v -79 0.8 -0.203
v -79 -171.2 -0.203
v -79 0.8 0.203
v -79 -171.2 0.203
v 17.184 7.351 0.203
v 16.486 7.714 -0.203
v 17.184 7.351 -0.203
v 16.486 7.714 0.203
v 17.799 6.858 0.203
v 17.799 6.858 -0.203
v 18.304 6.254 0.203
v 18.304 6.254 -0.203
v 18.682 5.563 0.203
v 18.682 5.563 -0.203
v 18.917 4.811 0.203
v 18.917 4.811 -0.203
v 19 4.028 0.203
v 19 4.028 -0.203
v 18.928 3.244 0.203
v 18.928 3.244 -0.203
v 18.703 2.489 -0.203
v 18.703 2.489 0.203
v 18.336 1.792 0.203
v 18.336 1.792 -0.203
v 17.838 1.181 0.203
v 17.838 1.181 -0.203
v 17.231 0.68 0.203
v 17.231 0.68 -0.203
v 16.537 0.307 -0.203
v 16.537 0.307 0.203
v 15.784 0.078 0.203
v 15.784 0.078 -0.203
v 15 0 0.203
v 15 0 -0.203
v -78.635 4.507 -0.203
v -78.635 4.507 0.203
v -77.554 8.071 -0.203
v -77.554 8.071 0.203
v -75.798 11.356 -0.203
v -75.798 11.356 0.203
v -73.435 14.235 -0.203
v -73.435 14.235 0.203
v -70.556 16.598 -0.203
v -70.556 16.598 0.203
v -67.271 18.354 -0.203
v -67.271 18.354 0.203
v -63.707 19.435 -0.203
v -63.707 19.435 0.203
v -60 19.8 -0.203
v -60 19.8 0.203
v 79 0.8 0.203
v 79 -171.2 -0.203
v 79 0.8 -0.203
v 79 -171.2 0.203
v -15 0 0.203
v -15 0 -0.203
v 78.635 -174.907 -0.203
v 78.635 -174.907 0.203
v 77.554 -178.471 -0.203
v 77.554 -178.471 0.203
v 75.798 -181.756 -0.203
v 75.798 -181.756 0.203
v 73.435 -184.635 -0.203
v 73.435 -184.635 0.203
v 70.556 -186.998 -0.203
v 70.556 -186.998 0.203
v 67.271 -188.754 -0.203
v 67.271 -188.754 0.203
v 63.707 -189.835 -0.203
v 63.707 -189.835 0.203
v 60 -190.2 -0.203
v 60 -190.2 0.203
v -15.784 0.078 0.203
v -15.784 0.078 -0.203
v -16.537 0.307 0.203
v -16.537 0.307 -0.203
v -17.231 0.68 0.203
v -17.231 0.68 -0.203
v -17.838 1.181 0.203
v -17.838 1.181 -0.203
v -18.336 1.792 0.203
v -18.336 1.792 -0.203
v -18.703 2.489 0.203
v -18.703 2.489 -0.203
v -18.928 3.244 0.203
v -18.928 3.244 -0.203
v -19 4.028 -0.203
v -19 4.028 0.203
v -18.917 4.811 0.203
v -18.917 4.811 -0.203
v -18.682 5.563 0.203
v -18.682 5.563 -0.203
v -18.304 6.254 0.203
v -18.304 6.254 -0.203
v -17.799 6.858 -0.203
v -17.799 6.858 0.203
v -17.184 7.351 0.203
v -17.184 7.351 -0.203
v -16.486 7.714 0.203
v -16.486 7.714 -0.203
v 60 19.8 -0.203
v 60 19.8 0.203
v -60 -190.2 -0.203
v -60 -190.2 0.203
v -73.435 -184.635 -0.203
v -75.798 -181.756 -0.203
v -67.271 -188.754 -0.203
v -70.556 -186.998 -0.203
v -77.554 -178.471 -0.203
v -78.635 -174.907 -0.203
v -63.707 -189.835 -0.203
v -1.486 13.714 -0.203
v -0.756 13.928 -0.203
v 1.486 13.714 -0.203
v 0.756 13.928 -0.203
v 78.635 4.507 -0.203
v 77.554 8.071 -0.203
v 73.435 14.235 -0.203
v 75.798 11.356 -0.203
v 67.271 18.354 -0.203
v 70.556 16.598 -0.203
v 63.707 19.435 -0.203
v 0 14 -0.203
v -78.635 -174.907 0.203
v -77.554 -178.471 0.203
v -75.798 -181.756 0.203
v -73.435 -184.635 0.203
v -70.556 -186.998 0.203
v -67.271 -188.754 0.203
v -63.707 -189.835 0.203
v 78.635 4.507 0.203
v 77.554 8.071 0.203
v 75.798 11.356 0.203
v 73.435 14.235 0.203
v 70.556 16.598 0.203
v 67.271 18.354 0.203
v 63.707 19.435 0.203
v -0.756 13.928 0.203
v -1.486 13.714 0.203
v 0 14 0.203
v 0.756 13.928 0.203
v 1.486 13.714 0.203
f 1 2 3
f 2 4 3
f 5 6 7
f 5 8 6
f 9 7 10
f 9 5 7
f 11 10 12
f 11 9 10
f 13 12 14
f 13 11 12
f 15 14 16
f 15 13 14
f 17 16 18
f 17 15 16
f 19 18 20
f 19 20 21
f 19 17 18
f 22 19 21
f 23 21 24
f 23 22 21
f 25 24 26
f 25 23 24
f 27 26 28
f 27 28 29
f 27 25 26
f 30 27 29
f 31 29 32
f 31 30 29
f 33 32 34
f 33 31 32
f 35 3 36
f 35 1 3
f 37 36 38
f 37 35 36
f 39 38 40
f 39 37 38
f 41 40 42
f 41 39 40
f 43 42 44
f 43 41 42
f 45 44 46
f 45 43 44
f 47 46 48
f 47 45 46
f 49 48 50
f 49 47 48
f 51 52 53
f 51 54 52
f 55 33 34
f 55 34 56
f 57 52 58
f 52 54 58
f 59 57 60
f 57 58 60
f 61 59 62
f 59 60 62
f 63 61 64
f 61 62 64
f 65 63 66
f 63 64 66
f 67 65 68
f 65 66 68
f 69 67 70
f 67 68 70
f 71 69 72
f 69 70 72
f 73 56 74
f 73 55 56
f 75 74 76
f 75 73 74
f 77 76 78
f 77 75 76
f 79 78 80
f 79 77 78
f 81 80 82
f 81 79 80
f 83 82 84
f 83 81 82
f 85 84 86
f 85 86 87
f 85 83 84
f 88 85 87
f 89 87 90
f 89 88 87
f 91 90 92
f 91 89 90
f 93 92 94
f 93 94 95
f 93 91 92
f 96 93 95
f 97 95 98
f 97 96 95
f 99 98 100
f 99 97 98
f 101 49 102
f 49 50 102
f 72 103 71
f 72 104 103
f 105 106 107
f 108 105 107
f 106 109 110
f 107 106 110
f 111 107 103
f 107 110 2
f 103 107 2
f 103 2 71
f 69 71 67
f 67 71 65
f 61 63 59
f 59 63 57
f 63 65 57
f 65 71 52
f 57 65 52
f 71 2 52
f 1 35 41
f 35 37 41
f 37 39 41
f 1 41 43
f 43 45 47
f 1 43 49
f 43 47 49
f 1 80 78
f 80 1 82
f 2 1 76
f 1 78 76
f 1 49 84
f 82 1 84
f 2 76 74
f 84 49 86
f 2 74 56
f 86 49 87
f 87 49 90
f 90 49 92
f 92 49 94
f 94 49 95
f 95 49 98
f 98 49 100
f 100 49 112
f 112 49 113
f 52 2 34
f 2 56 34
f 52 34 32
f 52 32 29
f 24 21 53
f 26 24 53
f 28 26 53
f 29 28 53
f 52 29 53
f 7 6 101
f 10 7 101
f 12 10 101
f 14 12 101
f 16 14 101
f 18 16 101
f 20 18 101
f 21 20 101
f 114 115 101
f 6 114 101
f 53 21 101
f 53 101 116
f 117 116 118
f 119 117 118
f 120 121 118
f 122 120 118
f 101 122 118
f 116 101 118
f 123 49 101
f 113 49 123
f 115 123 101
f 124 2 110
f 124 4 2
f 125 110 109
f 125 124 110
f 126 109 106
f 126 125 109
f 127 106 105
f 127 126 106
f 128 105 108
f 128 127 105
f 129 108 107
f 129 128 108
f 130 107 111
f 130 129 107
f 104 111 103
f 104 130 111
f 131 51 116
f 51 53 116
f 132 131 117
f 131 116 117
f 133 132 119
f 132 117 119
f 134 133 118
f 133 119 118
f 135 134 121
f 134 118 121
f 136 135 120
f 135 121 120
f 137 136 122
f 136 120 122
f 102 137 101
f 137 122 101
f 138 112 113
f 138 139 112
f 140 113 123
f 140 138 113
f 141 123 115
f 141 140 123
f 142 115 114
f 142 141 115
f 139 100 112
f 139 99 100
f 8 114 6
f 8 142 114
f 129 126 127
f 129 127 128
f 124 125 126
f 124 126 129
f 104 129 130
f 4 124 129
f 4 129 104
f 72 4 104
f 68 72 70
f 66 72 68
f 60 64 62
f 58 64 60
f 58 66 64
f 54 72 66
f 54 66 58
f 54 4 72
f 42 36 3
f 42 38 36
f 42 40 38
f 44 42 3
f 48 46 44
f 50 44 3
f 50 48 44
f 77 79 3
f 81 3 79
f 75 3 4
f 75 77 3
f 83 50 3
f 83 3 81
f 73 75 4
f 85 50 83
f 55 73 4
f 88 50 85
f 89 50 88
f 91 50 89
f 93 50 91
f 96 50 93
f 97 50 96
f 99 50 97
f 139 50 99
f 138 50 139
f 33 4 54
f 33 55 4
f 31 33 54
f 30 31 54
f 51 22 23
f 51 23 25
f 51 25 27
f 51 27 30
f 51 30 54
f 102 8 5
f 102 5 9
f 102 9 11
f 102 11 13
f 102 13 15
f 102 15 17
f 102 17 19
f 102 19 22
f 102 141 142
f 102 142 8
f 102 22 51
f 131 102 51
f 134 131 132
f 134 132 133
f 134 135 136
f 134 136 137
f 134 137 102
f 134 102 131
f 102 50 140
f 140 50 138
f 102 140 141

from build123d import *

# Parameters (mm, degrees)
F0_W     = 158
F0_H     = 210
F1_DEPTH = 0.2032
F2_R     = 19


with BuildPart() as f1:
    # F0 (on Top) → F1 (new body, symmetric)
    with BuildSketch(Plane.XY):
        with Locations((0, -85.2)):
            Rectangle(F0_W, F0_H)
        with BuildLine():
            Line((15, 0), (-15, 0))
            ThreePointArc((-15, 0), (-18.927826, 3.24357), (-16.485563, 7.713907))
            Line((-16.485563, 7.713907), (-1.485563, 13.713907))
            ThreePointArc((-1.485563, 13.713907), (0, 14), (1.485563, 13.713907))
            Line((1.485563, 13.713907), (16.485563, 7.713907))
            ThreePointArc((16.485563, 7.713907), (18.927826, 3.24357), (15, 0))
        make_face(mode=Mode.SUBTRACT)
    extrude(amount=F1_DEPTH, both=True)

    # F2
    f2_edges = [f1.edges().sort_by_distance(p)[0] for p in [
        (79, 19.8, 0),
        (-79, 19.8, 0),
        (79, -190.2, 0),
        (-79, -190.2, 0),
    ]]
    fillet(f2_edges, radius=F2_R)


solid = f1.part
